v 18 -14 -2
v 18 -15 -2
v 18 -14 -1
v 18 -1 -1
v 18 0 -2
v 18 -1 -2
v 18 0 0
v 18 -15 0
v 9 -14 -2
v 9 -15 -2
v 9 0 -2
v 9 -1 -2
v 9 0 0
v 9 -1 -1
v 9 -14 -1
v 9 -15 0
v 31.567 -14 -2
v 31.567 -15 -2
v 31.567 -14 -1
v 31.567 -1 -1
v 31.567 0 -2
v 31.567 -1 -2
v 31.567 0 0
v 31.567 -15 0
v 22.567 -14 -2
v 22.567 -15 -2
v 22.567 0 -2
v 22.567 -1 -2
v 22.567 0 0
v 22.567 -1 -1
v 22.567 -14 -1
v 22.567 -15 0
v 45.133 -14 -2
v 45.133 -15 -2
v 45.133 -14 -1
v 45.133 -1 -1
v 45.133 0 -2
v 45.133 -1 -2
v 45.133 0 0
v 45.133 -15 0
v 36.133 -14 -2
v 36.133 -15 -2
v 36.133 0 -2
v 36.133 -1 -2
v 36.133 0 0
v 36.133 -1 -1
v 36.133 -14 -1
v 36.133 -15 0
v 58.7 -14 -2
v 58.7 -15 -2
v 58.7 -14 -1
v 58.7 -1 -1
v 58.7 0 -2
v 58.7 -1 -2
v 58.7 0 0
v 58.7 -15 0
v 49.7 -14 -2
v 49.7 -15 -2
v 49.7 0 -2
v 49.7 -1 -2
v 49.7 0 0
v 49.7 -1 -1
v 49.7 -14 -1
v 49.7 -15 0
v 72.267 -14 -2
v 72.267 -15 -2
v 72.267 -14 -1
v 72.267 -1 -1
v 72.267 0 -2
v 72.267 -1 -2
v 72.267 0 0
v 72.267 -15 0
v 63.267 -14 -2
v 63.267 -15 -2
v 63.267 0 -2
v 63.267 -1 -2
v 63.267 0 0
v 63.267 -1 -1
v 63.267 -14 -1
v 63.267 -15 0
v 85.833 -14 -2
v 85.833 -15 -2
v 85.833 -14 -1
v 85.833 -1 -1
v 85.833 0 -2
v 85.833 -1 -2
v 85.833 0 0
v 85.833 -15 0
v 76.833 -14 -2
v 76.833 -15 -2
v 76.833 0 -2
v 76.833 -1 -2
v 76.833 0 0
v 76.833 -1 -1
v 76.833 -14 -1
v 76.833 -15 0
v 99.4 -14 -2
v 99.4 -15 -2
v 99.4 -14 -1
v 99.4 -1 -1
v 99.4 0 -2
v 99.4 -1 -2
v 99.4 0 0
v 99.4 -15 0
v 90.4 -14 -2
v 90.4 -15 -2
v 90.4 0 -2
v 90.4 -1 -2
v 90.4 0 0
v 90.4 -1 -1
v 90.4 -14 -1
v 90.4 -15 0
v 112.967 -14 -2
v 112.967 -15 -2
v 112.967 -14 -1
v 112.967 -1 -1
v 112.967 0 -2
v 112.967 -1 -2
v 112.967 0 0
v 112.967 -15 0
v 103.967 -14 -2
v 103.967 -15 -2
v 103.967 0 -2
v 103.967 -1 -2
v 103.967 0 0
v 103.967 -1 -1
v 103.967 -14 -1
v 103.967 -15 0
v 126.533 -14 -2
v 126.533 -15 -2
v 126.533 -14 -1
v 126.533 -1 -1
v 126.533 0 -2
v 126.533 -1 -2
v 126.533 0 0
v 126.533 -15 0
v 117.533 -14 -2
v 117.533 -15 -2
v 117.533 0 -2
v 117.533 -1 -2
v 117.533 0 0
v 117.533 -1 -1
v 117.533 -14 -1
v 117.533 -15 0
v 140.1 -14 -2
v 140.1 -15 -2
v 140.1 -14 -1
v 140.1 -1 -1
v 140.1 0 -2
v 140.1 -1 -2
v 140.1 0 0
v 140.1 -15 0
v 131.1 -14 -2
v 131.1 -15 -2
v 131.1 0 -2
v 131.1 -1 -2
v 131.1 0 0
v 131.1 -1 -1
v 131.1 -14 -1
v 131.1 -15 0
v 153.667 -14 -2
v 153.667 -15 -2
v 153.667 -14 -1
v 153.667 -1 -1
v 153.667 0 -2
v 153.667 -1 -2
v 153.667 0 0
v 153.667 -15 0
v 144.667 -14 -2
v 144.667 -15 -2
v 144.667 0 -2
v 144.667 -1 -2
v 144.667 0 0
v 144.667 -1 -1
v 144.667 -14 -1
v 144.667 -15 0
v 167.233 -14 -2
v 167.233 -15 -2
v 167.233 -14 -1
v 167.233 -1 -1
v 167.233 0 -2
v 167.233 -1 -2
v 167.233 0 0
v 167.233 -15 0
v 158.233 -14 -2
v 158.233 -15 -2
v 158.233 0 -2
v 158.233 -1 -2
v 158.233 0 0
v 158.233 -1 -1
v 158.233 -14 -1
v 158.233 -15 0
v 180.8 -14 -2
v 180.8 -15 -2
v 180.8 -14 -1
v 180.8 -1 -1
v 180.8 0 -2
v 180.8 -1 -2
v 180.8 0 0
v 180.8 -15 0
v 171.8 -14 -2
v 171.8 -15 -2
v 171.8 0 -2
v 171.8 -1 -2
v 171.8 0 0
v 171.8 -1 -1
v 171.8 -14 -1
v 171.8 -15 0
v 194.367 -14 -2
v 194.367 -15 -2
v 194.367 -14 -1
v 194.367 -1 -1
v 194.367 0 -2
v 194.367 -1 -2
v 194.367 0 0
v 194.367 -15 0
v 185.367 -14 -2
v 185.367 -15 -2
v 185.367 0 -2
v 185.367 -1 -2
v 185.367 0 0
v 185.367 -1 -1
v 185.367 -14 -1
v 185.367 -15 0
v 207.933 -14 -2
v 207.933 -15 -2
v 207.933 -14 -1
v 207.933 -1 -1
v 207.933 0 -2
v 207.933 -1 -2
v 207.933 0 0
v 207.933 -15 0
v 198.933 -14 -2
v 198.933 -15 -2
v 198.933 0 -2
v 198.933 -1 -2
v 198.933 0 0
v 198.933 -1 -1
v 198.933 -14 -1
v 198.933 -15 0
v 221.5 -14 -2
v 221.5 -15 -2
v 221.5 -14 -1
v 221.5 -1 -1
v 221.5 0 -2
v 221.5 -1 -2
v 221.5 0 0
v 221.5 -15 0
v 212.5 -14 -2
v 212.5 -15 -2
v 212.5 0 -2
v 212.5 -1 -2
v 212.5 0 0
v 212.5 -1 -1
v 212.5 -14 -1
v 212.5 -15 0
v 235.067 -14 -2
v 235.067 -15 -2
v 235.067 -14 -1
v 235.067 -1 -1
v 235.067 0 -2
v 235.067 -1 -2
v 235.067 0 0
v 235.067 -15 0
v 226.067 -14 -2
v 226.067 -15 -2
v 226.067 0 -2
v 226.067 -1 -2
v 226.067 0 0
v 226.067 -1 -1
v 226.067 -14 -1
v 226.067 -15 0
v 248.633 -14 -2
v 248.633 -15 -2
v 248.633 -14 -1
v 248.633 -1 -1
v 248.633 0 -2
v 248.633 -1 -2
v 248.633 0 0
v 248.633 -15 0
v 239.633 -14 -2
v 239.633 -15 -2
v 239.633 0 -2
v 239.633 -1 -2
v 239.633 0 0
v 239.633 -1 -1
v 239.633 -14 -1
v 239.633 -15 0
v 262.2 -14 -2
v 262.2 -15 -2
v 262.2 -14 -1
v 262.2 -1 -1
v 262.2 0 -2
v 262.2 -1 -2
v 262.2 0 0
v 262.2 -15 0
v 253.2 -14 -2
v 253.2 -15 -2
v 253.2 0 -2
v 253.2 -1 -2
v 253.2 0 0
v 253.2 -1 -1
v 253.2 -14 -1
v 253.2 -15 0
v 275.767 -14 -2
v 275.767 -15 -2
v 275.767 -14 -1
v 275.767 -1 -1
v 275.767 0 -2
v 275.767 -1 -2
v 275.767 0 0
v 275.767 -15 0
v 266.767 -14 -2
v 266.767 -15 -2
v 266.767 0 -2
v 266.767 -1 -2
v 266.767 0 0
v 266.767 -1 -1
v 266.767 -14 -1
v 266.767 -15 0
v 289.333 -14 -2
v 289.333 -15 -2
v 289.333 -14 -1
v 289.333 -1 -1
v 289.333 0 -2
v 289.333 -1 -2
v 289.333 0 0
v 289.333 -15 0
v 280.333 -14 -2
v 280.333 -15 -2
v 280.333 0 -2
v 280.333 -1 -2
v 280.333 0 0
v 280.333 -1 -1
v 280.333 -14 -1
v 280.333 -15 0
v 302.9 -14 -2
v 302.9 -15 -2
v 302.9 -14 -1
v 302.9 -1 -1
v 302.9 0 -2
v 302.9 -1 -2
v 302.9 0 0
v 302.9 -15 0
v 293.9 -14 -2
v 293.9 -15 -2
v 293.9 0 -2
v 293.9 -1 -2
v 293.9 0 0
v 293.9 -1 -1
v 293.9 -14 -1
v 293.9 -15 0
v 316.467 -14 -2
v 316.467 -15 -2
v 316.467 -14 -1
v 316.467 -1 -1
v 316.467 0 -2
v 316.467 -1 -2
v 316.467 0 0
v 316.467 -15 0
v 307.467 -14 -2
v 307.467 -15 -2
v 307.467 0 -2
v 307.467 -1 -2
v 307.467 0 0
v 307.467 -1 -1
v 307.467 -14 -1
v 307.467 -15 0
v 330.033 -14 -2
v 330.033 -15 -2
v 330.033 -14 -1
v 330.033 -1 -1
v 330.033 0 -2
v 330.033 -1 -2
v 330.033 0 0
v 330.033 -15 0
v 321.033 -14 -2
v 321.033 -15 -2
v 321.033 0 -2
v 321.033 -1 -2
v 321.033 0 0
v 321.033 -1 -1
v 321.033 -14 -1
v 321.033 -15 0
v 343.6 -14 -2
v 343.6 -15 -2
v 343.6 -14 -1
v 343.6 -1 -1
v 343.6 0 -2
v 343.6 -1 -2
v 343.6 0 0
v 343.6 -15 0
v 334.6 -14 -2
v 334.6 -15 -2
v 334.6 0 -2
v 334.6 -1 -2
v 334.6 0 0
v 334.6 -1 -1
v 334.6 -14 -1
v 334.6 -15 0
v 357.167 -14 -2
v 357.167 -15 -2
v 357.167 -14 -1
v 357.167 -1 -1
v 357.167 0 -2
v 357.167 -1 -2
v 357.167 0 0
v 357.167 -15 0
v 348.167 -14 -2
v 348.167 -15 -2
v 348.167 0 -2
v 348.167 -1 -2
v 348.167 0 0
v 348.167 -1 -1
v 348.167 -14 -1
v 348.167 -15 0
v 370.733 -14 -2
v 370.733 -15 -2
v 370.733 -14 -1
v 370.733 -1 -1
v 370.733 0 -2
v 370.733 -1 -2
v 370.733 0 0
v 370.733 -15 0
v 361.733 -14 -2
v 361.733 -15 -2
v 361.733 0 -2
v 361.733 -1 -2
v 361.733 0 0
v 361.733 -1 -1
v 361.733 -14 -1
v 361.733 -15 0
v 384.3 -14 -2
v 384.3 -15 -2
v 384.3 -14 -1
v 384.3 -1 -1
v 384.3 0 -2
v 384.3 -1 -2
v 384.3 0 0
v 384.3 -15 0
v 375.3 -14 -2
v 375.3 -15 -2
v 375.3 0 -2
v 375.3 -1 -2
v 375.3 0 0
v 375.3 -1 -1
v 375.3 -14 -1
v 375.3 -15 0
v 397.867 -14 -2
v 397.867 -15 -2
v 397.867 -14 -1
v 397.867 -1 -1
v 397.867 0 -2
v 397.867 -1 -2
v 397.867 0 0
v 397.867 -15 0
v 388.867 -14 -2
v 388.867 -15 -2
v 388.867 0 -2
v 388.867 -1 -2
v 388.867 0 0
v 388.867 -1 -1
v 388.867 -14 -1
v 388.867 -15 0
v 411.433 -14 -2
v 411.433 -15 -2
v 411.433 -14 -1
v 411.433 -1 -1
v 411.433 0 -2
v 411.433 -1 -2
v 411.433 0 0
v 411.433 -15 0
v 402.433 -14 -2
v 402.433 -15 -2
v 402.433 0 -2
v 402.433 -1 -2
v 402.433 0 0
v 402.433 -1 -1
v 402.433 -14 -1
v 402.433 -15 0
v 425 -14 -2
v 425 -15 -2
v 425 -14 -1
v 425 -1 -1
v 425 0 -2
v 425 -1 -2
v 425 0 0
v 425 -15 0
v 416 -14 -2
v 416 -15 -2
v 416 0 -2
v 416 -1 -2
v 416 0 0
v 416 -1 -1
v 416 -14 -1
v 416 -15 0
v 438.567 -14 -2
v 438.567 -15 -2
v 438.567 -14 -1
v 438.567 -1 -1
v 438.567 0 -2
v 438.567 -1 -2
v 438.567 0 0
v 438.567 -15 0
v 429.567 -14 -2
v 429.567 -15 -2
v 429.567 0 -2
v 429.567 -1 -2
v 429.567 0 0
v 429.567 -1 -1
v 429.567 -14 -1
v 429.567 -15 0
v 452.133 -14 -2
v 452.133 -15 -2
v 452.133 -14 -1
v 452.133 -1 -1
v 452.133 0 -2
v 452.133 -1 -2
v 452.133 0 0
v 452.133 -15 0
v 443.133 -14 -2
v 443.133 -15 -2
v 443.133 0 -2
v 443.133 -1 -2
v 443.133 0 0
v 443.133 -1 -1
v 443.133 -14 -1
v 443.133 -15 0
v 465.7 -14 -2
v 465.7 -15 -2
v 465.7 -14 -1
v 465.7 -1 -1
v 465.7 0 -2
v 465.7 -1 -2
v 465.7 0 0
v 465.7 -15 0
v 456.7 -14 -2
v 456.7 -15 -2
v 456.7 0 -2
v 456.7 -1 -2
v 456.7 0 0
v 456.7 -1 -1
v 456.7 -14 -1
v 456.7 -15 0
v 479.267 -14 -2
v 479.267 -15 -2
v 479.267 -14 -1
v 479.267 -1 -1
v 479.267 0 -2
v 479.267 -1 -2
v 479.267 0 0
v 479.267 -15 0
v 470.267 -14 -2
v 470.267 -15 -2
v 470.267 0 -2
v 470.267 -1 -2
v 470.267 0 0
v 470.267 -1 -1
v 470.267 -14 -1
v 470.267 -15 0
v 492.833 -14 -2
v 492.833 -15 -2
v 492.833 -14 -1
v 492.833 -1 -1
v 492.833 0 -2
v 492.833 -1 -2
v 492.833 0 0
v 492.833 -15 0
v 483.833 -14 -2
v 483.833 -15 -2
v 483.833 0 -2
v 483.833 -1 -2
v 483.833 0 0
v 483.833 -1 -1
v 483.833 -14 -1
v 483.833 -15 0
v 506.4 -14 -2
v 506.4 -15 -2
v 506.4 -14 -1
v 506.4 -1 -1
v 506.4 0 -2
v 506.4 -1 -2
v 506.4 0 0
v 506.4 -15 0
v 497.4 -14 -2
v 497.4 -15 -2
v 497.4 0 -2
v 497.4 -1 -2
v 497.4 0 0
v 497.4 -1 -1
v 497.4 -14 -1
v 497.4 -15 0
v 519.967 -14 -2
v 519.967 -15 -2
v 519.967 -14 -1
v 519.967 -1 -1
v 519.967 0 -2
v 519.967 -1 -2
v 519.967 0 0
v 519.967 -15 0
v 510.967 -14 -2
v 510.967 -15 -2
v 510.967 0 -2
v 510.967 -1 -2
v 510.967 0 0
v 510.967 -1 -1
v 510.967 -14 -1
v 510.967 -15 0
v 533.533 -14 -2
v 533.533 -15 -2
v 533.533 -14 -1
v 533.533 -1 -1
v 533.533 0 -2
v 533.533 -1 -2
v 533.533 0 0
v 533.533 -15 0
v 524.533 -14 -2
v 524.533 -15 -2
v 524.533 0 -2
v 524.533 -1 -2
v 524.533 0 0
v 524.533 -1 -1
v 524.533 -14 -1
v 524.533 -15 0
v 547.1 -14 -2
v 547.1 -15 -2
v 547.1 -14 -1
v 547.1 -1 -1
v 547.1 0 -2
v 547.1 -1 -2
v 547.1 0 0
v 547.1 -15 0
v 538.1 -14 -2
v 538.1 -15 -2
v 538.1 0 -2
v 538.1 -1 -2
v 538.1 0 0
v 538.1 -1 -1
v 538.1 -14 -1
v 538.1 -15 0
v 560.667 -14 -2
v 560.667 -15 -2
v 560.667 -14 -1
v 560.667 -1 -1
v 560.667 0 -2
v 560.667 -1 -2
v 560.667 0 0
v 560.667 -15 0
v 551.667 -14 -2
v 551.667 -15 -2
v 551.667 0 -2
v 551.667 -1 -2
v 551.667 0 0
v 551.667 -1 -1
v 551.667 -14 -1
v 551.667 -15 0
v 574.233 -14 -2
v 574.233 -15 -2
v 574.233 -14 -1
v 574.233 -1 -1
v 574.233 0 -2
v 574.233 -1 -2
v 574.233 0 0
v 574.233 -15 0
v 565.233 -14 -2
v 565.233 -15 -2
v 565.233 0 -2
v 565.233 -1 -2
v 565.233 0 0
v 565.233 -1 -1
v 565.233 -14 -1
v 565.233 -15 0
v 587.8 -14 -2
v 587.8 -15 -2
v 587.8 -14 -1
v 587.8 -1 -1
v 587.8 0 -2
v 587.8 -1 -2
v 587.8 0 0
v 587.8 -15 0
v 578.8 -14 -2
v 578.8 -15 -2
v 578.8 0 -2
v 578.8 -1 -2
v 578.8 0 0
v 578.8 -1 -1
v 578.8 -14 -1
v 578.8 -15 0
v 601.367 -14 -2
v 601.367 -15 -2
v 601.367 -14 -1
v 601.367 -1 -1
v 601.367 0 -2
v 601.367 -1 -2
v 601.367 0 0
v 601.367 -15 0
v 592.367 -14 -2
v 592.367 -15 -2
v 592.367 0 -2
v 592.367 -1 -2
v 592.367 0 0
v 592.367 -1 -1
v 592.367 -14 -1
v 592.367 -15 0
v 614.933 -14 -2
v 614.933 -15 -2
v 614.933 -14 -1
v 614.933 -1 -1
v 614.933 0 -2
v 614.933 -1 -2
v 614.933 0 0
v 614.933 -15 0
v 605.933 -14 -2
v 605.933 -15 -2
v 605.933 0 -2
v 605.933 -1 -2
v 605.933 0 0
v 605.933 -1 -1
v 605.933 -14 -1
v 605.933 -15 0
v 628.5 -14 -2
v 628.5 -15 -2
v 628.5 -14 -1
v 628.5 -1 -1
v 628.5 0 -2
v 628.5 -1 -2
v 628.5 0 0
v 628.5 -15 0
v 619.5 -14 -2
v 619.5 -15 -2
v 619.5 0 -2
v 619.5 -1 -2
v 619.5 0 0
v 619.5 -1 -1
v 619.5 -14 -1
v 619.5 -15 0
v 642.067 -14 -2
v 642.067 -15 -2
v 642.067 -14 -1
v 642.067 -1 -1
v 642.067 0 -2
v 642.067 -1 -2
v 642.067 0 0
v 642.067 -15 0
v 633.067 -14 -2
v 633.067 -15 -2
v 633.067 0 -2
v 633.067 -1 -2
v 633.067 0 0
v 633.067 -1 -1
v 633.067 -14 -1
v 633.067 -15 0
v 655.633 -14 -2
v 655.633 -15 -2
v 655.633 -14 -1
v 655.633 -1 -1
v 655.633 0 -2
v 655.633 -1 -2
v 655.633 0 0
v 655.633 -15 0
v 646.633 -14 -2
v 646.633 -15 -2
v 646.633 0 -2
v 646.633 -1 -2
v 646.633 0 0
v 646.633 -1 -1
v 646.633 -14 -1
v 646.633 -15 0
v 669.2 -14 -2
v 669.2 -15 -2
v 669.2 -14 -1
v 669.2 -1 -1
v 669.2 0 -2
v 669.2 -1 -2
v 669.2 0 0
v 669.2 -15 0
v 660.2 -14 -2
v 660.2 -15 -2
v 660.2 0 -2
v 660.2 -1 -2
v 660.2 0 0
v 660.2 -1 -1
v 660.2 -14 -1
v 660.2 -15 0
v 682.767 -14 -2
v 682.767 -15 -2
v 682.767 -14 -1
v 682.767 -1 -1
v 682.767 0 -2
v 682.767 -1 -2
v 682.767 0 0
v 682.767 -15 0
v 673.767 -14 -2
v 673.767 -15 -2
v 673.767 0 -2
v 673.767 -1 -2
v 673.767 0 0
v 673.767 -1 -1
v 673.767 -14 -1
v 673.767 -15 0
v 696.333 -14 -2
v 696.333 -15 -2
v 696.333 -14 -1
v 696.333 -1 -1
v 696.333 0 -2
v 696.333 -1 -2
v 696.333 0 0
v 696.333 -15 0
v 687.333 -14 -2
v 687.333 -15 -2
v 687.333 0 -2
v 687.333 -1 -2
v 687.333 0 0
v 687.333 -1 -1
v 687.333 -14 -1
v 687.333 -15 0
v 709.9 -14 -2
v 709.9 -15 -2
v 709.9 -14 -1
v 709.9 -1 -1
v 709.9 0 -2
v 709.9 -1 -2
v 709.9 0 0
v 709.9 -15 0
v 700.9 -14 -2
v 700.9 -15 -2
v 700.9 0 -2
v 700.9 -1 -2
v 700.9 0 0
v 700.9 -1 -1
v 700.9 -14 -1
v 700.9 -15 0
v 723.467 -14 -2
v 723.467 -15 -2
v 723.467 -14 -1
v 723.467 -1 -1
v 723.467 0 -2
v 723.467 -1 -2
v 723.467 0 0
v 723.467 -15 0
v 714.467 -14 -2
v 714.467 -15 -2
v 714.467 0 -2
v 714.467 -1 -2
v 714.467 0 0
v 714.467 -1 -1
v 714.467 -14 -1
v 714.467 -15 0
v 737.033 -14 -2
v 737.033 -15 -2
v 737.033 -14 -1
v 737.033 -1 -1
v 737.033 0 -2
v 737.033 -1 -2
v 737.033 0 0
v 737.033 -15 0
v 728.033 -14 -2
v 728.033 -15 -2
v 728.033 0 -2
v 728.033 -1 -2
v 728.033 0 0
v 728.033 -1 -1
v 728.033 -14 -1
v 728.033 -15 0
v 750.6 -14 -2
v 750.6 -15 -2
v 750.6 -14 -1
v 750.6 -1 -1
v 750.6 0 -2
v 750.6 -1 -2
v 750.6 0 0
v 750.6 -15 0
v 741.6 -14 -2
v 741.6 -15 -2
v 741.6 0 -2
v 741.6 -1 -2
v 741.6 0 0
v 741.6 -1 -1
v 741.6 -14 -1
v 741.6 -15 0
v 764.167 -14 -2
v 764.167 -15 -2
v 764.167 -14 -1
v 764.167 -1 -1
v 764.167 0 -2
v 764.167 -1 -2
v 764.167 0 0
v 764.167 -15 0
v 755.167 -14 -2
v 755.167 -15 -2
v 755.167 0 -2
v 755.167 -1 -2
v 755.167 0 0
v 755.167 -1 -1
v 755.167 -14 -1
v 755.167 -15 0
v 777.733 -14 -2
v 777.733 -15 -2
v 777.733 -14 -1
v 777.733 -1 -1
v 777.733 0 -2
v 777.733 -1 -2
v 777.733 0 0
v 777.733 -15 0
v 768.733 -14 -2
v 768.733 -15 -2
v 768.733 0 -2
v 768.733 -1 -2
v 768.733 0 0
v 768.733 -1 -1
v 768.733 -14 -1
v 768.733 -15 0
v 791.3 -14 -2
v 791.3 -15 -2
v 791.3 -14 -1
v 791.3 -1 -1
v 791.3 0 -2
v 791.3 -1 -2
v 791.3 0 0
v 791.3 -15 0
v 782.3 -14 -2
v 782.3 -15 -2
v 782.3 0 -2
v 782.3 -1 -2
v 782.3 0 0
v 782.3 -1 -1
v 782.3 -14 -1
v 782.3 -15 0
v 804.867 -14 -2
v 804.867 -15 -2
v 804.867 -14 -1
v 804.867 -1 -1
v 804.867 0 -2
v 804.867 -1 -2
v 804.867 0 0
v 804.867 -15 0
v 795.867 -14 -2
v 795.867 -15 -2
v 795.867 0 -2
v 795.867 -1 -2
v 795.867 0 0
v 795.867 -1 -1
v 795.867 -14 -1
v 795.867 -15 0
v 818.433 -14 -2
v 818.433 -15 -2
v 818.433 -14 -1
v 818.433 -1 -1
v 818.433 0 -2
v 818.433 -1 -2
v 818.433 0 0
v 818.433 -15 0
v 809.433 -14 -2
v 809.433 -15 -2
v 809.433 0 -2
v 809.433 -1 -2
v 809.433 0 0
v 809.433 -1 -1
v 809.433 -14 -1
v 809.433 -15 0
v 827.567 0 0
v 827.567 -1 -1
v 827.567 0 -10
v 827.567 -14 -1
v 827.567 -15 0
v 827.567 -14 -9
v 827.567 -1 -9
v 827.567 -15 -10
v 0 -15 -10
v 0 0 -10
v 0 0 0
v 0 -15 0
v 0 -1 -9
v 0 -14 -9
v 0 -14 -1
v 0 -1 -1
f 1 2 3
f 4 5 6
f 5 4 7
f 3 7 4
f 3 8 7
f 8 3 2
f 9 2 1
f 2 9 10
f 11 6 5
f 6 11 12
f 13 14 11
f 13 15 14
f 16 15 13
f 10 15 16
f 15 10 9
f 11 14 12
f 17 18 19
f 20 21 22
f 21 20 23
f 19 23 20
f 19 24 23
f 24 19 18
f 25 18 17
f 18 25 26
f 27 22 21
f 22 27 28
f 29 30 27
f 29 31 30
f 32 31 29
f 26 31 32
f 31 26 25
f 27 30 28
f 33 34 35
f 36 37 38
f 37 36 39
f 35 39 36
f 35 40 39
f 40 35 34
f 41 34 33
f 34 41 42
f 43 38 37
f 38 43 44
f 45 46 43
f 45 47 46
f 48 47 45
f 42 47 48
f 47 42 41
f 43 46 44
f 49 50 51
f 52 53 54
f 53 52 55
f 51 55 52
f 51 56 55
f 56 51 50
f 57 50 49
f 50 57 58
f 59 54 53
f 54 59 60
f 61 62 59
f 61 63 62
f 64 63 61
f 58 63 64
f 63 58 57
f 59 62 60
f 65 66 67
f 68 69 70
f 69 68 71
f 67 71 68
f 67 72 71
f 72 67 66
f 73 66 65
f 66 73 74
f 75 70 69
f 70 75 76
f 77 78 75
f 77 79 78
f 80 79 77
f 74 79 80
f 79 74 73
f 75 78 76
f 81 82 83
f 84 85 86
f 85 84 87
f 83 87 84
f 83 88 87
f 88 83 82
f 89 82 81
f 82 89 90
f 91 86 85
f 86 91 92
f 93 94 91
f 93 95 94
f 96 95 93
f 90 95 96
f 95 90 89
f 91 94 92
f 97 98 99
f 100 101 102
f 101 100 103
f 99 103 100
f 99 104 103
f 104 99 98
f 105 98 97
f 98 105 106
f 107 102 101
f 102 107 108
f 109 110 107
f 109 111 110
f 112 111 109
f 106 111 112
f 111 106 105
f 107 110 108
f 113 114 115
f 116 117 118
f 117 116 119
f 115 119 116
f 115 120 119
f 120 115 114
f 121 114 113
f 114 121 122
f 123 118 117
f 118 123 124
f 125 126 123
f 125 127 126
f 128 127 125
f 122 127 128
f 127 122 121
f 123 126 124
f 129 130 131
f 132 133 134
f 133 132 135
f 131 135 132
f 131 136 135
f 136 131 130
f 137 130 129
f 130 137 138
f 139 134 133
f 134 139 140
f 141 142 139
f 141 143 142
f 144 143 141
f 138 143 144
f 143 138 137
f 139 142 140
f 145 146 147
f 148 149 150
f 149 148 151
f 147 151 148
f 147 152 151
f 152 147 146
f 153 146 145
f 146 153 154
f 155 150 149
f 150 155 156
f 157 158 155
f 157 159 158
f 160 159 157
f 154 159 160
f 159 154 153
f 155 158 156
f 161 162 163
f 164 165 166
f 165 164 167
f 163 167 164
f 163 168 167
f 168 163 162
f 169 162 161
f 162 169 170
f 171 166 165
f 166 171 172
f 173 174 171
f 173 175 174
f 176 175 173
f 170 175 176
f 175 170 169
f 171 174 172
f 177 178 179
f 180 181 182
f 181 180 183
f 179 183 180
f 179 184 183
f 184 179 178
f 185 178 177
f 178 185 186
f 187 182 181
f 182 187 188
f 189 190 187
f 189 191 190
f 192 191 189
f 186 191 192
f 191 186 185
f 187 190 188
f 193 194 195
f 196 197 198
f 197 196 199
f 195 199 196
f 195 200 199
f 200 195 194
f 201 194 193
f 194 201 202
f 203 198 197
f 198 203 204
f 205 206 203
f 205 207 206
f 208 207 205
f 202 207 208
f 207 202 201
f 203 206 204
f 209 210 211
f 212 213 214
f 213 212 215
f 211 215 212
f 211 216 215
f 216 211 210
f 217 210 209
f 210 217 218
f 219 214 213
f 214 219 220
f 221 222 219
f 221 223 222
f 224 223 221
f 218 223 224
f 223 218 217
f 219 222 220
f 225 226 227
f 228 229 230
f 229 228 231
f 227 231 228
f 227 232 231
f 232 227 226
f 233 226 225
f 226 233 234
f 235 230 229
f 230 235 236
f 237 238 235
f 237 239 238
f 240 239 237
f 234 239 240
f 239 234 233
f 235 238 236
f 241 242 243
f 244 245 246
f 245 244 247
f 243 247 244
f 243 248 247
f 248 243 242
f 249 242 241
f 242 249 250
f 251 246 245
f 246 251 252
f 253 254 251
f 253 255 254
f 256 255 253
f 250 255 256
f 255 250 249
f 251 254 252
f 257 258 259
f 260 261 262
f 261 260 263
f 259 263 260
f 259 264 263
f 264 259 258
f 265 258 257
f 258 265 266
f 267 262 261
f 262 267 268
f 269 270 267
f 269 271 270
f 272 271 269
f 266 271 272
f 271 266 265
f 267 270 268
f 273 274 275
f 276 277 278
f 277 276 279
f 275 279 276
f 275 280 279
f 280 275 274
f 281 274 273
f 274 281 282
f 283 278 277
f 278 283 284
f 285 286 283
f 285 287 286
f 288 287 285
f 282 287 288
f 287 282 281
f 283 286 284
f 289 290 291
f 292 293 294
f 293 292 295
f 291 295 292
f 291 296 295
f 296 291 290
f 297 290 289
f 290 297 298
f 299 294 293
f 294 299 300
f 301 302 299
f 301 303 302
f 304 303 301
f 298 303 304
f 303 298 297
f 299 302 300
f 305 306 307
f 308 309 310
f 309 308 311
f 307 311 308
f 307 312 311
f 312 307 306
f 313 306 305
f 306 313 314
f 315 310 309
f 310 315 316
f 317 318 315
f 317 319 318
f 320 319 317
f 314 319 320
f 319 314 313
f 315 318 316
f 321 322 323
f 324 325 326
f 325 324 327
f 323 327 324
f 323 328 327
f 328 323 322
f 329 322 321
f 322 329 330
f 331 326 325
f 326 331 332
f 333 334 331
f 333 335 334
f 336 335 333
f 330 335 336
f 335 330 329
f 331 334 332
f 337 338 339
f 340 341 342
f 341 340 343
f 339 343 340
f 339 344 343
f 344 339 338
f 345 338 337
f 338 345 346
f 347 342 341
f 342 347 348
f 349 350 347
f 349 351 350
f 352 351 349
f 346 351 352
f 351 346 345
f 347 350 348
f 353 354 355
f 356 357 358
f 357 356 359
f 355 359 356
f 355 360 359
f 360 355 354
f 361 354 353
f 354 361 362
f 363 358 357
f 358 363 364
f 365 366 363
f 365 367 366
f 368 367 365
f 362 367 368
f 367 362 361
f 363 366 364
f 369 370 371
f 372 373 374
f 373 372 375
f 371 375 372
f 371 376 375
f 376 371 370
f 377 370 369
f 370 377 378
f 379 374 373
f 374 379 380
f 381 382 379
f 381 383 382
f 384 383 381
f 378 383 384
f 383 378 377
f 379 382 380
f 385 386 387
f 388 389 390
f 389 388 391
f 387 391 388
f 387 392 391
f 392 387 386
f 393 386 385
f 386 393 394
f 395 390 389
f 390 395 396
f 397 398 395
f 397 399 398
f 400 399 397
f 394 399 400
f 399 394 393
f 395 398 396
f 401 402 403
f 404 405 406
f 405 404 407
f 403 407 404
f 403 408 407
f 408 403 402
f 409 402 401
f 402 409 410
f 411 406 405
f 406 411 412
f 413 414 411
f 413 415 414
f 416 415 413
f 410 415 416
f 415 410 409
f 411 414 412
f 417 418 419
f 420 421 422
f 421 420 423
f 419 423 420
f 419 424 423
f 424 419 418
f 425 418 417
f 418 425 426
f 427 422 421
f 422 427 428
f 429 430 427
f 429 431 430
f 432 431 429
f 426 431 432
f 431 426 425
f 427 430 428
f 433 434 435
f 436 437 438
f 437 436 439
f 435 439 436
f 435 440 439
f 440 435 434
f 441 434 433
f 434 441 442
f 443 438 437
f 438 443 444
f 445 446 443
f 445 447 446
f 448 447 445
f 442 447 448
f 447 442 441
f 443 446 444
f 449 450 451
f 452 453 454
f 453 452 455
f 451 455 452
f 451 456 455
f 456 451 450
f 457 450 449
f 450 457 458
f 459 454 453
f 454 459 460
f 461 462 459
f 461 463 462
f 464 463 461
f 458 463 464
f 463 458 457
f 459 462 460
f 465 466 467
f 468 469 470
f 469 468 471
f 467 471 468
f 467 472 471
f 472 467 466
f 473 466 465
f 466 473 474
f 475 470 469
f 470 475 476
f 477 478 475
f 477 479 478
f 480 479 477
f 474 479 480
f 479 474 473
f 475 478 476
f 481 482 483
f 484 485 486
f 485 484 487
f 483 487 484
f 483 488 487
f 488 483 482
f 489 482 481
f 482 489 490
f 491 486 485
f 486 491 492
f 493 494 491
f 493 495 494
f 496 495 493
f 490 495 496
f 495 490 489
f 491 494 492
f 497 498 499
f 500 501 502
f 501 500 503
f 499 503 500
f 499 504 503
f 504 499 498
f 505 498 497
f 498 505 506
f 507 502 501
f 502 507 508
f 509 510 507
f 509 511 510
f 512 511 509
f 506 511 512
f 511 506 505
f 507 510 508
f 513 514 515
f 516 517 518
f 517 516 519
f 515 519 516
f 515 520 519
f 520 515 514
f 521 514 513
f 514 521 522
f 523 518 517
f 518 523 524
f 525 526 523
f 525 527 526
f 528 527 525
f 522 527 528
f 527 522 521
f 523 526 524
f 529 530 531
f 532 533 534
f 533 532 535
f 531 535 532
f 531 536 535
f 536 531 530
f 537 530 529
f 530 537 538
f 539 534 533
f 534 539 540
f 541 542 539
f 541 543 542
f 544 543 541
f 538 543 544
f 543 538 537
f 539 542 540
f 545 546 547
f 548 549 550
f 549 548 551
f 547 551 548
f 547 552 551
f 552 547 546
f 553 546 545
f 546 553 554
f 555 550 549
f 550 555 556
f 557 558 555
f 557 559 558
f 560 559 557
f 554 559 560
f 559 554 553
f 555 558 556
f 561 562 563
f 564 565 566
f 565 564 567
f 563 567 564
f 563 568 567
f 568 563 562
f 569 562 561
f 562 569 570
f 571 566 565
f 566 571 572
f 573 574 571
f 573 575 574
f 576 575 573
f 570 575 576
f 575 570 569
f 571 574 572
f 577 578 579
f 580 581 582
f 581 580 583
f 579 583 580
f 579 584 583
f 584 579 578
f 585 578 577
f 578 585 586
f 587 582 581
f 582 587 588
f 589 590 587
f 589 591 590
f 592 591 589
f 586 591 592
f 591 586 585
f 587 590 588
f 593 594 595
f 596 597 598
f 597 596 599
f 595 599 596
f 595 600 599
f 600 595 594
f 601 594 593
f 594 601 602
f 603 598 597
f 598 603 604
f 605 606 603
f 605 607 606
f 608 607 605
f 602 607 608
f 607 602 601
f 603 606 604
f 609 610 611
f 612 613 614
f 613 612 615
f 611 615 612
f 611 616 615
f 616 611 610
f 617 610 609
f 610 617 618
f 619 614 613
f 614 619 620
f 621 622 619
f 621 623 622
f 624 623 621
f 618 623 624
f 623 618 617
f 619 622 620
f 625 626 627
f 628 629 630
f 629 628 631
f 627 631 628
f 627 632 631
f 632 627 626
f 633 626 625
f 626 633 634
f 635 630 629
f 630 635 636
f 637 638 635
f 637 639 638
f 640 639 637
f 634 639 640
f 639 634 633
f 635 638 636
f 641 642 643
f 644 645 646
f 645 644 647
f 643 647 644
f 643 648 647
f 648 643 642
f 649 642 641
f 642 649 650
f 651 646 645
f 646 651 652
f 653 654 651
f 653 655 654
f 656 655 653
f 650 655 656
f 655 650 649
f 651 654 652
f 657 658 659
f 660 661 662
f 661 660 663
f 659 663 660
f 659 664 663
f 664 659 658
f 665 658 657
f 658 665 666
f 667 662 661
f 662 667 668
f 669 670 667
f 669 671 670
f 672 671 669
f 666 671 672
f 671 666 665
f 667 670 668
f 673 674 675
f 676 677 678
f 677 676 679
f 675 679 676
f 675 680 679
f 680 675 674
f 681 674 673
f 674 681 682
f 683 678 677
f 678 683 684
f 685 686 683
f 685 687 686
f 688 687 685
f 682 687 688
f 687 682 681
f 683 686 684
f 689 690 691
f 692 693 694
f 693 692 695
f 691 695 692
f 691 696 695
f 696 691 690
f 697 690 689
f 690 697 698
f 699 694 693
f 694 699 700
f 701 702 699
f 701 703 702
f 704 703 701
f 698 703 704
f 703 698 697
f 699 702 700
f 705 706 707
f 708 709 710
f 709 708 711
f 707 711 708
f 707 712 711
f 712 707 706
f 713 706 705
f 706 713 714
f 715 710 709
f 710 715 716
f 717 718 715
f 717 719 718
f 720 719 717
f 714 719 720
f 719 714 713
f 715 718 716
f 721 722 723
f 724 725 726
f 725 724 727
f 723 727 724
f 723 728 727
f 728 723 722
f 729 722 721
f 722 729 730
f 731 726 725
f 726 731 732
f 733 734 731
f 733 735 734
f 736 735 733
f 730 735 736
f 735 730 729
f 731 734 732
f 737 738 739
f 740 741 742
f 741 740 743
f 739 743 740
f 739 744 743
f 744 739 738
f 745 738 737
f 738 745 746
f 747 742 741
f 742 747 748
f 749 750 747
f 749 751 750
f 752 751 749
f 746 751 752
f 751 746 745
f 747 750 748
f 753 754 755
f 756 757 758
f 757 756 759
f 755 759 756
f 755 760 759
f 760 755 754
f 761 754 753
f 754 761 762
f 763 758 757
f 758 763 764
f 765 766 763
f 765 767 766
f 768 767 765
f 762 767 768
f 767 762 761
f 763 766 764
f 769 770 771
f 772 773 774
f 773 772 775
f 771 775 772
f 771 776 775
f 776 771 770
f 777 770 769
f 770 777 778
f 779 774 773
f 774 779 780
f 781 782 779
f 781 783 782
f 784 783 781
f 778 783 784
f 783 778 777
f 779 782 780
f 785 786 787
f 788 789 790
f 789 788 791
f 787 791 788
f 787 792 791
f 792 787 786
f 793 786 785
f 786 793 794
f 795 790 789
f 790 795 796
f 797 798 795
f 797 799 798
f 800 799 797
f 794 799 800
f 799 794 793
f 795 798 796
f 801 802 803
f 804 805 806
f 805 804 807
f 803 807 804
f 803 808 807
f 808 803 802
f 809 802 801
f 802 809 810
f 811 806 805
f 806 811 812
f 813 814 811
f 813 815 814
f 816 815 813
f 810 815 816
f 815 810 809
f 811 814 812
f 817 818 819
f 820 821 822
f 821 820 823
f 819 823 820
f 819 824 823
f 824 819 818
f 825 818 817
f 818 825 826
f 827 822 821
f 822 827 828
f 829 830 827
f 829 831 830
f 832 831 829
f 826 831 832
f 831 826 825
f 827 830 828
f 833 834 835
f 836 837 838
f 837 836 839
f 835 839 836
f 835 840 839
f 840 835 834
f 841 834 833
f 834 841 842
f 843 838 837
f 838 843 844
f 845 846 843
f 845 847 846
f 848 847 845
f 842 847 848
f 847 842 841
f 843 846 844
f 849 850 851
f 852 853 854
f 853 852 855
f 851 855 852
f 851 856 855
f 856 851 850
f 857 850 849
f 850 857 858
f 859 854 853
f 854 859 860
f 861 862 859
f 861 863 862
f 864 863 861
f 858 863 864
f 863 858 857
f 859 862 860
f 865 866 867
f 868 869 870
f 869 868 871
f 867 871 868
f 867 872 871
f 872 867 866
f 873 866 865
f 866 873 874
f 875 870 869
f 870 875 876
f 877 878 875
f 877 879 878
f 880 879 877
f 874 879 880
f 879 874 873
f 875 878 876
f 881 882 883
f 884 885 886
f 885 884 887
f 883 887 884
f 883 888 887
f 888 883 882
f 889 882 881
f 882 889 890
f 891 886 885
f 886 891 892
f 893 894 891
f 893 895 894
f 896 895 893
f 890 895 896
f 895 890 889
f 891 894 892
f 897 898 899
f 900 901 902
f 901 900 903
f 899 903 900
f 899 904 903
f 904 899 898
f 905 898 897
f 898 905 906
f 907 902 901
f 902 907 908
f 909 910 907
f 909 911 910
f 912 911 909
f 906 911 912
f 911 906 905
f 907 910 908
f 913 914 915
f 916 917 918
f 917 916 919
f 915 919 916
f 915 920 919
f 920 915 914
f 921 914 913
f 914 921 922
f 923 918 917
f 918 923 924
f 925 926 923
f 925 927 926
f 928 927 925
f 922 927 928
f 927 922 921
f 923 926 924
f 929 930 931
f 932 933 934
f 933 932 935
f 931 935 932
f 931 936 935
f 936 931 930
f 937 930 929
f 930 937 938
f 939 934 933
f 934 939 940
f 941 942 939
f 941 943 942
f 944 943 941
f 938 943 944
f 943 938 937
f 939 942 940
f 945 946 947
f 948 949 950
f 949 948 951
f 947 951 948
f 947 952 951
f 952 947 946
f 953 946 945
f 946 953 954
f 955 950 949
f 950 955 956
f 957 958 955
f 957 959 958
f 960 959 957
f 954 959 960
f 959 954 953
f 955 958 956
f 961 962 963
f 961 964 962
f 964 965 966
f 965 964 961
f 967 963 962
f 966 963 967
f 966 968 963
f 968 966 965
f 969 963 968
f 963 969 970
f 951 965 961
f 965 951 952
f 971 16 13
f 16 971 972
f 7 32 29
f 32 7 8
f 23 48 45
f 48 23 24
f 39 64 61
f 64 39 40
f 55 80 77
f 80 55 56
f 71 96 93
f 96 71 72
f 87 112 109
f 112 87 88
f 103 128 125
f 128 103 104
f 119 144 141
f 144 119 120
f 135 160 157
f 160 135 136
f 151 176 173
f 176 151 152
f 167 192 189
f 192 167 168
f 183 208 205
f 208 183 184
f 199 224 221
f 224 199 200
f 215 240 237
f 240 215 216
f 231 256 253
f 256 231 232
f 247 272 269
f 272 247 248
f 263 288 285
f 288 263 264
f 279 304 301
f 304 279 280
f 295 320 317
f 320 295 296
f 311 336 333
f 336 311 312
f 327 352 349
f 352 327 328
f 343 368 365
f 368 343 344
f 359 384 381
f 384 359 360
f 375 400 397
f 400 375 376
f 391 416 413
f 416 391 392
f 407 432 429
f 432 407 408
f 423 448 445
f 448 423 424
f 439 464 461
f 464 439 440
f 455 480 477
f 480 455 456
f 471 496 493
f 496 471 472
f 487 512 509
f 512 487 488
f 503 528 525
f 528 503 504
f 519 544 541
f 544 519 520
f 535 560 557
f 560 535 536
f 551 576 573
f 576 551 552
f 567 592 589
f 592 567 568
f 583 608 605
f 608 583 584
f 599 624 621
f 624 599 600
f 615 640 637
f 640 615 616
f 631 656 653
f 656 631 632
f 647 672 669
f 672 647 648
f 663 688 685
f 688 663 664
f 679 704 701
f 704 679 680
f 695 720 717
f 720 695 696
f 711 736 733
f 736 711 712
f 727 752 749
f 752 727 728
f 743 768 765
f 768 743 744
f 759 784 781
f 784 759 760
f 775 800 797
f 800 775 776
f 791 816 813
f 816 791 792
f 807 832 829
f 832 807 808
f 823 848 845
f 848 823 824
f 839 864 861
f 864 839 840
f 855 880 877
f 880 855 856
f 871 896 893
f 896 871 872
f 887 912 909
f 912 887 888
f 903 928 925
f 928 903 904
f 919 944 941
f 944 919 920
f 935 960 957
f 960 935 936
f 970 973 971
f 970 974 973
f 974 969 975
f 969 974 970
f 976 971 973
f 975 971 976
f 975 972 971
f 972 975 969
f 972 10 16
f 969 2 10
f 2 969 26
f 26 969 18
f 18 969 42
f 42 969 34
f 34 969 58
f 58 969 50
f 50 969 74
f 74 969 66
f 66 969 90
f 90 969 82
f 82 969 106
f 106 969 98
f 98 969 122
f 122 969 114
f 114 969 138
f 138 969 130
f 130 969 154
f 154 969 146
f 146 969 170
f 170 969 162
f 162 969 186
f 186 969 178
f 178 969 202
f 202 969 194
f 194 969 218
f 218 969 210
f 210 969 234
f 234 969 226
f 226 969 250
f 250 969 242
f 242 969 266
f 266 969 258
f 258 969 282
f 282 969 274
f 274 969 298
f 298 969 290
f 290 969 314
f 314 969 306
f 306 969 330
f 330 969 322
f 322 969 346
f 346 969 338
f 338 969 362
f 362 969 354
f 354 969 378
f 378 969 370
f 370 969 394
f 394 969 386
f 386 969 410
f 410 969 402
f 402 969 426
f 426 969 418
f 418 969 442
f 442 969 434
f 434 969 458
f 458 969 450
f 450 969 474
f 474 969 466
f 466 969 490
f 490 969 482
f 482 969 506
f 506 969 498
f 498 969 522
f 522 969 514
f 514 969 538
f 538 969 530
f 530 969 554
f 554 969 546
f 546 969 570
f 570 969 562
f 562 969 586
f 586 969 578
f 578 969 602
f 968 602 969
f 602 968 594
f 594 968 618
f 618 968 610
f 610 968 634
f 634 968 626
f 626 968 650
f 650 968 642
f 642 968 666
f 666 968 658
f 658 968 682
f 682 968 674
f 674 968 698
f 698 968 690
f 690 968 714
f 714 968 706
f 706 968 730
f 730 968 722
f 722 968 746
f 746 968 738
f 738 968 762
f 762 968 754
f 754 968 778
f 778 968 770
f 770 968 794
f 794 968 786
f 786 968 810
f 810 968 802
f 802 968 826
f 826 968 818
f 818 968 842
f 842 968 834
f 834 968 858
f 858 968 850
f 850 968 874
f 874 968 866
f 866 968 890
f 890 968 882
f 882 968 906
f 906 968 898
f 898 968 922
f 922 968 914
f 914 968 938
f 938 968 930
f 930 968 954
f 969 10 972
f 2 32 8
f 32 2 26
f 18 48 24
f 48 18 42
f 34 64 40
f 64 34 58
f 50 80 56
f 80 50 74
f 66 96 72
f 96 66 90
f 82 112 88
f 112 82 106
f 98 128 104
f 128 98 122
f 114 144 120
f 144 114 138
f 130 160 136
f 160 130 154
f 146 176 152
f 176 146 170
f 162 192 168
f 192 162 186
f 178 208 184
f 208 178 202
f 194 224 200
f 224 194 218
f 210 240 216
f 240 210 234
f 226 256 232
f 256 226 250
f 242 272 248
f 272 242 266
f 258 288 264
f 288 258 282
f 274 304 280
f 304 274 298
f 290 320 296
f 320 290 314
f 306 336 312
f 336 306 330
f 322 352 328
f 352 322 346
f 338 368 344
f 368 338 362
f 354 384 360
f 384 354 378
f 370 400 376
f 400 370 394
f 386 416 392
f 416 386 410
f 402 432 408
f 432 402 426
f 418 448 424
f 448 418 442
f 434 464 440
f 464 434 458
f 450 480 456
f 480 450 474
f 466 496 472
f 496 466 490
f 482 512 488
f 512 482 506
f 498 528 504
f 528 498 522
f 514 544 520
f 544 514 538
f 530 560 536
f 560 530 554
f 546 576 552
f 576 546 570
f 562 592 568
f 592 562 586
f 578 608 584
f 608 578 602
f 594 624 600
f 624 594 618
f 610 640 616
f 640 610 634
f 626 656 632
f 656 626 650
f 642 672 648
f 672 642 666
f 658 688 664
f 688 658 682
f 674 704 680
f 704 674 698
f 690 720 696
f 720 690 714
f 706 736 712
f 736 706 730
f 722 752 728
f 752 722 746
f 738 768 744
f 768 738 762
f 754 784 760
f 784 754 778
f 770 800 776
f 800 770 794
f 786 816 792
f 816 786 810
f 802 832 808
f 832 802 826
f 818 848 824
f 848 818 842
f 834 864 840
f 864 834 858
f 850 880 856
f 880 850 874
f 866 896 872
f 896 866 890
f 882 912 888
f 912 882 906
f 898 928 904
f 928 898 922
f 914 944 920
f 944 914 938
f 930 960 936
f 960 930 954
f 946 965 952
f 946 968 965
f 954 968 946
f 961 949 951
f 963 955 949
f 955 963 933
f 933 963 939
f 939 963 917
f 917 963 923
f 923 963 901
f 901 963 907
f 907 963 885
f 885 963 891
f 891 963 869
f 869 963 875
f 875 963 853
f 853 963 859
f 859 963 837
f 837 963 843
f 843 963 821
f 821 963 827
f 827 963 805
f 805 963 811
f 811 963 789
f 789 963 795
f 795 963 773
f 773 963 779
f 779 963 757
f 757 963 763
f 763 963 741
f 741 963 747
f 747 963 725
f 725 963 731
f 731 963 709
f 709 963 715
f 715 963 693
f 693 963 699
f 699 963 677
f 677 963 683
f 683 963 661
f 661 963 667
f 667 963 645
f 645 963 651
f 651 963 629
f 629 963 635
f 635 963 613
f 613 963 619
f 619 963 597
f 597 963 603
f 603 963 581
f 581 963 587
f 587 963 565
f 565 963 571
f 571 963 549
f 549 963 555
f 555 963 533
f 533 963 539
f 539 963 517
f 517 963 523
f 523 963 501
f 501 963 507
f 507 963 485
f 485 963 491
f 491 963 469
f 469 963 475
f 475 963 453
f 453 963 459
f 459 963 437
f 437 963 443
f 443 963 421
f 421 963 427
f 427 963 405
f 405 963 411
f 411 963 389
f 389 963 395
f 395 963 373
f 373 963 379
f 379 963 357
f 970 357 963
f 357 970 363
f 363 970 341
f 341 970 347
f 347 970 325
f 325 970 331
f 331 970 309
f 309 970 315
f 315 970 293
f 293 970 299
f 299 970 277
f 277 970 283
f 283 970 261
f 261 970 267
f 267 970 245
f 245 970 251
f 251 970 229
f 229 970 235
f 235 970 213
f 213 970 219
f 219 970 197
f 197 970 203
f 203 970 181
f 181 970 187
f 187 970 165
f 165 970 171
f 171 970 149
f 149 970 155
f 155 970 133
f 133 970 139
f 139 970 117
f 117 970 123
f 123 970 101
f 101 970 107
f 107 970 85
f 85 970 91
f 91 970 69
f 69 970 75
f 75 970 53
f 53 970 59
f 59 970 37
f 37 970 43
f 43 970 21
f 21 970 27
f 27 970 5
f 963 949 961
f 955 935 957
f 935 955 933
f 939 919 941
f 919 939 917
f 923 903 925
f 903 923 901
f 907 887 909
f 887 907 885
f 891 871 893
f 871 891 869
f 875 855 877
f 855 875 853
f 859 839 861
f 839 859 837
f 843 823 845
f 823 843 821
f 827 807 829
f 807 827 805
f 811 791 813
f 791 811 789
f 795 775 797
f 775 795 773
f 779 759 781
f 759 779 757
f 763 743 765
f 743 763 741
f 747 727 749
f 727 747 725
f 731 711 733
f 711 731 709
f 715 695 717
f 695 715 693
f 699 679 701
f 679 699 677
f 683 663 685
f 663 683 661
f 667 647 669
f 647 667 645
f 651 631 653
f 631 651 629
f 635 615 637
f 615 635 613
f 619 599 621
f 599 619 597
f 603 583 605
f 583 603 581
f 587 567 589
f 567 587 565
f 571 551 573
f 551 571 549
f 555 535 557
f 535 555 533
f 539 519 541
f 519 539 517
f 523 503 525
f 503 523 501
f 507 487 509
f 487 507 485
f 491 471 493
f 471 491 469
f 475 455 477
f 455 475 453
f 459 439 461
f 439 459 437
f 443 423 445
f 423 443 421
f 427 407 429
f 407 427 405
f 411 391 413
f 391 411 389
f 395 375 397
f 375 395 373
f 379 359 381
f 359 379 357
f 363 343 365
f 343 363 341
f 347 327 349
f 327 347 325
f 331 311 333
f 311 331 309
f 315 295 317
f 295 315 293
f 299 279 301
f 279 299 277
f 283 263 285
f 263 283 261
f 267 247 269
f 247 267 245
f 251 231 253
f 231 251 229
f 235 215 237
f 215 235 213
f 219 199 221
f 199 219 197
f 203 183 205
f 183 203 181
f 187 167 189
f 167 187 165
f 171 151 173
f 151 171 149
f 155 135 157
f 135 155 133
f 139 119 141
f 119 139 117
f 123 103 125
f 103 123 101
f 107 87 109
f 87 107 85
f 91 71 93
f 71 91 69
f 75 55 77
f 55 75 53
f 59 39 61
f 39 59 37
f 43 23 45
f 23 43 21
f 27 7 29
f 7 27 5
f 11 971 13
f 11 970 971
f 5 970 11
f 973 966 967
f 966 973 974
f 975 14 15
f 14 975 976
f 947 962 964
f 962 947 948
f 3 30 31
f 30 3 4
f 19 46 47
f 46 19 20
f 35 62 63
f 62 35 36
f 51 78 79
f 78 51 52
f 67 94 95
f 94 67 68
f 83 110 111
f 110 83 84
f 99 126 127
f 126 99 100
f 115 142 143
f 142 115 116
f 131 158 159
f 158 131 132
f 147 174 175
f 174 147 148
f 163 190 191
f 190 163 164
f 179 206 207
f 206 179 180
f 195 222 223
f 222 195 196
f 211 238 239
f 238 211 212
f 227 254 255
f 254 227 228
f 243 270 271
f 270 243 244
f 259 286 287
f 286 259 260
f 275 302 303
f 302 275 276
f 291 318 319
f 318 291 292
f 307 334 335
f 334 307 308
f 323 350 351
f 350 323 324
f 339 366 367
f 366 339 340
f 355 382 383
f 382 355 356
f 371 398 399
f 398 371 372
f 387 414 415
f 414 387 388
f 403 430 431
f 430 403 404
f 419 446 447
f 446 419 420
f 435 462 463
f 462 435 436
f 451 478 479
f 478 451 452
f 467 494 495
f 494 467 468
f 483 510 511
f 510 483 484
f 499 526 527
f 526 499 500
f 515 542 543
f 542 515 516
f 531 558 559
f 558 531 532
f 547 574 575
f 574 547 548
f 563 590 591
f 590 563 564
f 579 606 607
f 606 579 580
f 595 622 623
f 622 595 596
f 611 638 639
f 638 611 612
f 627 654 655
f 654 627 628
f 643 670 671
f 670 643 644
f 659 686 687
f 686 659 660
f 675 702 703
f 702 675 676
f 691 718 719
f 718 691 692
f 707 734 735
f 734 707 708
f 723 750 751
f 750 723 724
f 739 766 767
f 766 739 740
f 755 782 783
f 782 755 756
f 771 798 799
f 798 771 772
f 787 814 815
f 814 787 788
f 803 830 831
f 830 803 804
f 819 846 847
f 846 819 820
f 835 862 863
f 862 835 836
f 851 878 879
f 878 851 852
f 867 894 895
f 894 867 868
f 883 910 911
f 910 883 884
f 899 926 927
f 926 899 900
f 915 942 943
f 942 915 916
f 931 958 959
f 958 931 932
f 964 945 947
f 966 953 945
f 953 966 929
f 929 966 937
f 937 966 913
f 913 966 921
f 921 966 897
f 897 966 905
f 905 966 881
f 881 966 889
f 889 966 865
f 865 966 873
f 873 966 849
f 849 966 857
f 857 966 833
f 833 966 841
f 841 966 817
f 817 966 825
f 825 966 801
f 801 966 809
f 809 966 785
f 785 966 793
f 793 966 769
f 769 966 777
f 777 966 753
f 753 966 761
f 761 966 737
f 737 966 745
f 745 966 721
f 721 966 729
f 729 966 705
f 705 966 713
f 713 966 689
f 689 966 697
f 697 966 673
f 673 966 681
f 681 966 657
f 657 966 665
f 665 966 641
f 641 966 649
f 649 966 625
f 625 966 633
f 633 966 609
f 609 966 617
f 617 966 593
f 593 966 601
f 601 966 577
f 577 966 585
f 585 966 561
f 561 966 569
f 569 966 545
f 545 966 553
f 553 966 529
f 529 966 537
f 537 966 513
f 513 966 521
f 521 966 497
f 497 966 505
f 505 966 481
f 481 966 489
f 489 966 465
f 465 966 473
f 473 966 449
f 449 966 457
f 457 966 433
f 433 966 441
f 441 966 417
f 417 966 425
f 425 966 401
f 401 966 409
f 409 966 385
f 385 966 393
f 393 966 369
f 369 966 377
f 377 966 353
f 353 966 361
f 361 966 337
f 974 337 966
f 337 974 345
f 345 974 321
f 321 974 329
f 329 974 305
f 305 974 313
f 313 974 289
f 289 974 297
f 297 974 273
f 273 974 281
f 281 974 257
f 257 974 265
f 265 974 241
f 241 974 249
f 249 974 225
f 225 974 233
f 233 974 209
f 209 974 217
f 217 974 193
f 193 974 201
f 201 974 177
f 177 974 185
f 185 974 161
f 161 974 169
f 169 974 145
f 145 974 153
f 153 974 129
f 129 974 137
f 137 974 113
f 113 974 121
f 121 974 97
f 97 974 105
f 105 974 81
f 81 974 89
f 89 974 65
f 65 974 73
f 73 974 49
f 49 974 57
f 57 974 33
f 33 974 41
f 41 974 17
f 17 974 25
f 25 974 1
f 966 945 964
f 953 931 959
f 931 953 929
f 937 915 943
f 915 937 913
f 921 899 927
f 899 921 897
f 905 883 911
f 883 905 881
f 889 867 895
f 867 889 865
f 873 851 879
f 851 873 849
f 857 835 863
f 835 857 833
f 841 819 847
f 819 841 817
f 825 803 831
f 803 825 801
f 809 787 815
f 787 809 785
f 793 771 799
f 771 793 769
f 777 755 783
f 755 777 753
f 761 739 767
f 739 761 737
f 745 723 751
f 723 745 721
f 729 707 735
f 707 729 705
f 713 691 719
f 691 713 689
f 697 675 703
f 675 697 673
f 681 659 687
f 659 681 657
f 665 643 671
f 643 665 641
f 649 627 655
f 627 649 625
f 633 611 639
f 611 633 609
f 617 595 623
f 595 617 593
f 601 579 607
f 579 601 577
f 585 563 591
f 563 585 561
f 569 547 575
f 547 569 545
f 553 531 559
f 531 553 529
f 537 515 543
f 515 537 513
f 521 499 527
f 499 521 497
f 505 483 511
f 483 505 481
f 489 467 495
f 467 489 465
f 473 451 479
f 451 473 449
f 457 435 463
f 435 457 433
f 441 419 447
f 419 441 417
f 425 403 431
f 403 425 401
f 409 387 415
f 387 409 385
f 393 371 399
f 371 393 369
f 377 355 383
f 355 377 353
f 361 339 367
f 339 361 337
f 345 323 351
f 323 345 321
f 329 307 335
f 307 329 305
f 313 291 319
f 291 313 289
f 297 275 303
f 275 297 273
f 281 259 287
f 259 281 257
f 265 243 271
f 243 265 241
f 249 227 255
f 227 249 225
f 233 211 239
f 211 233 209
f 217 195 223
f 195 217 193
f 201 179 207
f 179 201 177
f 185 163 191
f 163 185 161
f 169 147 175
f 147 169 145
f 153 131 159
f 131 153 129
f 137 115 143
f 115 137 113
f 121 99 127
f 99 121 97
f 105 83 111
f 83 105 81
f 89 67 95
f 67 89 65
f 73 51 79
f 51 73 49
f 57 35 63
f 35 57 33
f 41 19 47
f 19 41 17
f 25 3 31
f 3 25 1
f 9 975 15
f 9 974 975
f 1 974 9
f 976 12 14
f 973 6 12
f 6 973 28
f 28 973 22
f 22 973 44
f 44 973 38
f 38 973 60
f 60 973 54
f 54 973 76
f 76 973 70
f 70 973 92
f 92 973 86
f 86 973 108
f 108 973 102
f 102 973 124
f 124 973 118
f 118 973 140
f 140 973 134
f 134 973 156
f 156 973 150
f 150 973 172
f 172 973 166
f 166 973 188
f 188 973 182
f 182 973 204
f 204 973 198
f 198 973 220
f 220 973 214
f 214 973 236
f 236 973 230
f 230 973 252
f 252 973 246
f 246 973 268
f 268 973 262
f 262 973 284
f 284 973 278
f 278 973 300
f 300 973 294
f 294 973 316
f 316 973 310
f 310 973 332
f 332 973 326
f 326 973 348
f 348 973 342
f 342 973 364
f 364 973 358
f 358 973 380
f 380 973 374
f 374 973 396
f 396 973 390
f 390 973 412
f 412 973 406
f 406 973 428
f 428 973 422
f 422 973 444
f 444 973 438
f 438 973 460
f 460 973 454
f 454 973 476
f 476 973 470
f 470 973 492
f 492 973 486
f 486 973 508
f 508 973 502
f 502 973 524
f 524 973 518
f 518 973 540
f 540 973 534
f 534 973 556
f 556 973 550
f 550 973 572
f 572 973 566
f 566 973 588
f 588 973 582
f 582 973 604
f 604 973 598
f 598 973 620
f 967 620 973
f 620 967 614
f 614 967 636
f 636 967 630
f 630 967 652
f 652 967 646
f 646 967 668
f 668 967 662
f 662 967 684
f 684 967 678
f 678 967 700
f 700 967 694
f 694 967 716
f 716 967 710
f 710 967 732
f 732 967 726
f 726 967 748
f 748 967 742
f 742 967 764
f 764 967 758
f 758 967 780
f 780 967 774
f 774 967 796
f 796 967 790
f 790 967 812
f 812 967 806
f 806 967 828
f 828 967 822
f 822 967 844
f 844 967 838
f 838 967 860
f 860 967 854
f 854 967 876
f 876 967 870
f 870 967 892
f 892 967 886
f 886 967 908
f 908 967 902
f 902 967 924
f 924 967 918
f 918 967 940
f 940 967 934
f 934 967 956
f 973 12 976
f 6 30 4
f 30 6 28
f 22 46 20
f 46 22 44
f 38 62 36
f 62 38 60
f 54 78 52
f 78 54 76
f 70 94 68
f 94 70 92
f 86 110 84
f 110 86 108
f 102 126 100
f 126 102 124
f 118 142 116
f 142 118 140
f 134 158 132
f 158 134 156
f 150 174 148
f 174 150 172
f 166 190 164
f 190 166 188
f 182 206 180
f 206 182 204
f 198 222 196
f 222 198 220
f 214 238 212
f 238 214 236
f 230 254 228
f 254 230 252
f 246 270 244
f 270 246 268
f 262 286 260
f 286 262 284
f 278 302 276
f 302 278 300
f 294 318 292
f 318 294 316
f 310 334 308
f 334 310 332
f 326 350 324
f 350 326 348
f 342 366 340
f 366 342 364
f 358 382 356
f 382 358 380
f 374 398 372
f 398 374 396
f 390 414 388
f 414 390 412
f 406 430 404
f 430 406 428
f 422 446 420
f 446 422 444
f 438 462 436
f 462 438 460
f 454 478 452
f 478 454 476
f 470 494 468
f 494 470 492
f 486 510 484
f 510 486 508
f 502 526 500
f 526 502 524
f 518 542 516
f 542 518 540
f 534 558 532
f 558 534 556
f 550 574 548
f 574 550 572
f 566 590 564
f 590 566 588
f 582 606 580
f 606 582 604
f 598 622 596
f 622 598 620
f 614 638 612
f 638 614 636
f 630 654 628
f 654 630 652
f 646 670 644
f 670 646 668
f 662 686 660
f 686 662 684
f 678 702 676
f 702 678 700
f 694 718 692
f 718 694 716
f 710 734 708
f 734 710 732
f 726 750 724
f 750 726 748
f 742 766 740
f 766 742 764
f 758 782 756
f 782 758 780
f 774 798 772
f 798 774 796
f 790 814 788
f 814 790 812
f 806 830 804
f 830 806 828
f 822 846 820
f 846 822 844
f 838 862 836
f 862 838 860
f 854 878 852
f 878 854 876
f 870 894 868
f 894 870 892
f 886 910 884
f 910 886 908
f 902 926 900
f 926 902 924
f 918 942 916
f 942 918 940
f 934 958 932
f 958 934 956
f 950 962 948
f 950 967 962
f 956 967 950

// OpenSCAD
// midi-led-staff.scad

depth = 10; // z
height = 15; // y
width = 827.567; // x
width_60 = 814 ;

step= width_60 / 60; // 13.567

rotate([180,0,0])
{
    difference(){
        translate([0,0,0])  cube([width,height,depth]);
        translate([-5,1,1]) cube([width+10 ,height-2,depth-2 ]);

        for ( off =[9 : step: width_60 ] )
        {
            translate([ off,-10,-2])  cube([9,50,4]);
        }
    }
}
